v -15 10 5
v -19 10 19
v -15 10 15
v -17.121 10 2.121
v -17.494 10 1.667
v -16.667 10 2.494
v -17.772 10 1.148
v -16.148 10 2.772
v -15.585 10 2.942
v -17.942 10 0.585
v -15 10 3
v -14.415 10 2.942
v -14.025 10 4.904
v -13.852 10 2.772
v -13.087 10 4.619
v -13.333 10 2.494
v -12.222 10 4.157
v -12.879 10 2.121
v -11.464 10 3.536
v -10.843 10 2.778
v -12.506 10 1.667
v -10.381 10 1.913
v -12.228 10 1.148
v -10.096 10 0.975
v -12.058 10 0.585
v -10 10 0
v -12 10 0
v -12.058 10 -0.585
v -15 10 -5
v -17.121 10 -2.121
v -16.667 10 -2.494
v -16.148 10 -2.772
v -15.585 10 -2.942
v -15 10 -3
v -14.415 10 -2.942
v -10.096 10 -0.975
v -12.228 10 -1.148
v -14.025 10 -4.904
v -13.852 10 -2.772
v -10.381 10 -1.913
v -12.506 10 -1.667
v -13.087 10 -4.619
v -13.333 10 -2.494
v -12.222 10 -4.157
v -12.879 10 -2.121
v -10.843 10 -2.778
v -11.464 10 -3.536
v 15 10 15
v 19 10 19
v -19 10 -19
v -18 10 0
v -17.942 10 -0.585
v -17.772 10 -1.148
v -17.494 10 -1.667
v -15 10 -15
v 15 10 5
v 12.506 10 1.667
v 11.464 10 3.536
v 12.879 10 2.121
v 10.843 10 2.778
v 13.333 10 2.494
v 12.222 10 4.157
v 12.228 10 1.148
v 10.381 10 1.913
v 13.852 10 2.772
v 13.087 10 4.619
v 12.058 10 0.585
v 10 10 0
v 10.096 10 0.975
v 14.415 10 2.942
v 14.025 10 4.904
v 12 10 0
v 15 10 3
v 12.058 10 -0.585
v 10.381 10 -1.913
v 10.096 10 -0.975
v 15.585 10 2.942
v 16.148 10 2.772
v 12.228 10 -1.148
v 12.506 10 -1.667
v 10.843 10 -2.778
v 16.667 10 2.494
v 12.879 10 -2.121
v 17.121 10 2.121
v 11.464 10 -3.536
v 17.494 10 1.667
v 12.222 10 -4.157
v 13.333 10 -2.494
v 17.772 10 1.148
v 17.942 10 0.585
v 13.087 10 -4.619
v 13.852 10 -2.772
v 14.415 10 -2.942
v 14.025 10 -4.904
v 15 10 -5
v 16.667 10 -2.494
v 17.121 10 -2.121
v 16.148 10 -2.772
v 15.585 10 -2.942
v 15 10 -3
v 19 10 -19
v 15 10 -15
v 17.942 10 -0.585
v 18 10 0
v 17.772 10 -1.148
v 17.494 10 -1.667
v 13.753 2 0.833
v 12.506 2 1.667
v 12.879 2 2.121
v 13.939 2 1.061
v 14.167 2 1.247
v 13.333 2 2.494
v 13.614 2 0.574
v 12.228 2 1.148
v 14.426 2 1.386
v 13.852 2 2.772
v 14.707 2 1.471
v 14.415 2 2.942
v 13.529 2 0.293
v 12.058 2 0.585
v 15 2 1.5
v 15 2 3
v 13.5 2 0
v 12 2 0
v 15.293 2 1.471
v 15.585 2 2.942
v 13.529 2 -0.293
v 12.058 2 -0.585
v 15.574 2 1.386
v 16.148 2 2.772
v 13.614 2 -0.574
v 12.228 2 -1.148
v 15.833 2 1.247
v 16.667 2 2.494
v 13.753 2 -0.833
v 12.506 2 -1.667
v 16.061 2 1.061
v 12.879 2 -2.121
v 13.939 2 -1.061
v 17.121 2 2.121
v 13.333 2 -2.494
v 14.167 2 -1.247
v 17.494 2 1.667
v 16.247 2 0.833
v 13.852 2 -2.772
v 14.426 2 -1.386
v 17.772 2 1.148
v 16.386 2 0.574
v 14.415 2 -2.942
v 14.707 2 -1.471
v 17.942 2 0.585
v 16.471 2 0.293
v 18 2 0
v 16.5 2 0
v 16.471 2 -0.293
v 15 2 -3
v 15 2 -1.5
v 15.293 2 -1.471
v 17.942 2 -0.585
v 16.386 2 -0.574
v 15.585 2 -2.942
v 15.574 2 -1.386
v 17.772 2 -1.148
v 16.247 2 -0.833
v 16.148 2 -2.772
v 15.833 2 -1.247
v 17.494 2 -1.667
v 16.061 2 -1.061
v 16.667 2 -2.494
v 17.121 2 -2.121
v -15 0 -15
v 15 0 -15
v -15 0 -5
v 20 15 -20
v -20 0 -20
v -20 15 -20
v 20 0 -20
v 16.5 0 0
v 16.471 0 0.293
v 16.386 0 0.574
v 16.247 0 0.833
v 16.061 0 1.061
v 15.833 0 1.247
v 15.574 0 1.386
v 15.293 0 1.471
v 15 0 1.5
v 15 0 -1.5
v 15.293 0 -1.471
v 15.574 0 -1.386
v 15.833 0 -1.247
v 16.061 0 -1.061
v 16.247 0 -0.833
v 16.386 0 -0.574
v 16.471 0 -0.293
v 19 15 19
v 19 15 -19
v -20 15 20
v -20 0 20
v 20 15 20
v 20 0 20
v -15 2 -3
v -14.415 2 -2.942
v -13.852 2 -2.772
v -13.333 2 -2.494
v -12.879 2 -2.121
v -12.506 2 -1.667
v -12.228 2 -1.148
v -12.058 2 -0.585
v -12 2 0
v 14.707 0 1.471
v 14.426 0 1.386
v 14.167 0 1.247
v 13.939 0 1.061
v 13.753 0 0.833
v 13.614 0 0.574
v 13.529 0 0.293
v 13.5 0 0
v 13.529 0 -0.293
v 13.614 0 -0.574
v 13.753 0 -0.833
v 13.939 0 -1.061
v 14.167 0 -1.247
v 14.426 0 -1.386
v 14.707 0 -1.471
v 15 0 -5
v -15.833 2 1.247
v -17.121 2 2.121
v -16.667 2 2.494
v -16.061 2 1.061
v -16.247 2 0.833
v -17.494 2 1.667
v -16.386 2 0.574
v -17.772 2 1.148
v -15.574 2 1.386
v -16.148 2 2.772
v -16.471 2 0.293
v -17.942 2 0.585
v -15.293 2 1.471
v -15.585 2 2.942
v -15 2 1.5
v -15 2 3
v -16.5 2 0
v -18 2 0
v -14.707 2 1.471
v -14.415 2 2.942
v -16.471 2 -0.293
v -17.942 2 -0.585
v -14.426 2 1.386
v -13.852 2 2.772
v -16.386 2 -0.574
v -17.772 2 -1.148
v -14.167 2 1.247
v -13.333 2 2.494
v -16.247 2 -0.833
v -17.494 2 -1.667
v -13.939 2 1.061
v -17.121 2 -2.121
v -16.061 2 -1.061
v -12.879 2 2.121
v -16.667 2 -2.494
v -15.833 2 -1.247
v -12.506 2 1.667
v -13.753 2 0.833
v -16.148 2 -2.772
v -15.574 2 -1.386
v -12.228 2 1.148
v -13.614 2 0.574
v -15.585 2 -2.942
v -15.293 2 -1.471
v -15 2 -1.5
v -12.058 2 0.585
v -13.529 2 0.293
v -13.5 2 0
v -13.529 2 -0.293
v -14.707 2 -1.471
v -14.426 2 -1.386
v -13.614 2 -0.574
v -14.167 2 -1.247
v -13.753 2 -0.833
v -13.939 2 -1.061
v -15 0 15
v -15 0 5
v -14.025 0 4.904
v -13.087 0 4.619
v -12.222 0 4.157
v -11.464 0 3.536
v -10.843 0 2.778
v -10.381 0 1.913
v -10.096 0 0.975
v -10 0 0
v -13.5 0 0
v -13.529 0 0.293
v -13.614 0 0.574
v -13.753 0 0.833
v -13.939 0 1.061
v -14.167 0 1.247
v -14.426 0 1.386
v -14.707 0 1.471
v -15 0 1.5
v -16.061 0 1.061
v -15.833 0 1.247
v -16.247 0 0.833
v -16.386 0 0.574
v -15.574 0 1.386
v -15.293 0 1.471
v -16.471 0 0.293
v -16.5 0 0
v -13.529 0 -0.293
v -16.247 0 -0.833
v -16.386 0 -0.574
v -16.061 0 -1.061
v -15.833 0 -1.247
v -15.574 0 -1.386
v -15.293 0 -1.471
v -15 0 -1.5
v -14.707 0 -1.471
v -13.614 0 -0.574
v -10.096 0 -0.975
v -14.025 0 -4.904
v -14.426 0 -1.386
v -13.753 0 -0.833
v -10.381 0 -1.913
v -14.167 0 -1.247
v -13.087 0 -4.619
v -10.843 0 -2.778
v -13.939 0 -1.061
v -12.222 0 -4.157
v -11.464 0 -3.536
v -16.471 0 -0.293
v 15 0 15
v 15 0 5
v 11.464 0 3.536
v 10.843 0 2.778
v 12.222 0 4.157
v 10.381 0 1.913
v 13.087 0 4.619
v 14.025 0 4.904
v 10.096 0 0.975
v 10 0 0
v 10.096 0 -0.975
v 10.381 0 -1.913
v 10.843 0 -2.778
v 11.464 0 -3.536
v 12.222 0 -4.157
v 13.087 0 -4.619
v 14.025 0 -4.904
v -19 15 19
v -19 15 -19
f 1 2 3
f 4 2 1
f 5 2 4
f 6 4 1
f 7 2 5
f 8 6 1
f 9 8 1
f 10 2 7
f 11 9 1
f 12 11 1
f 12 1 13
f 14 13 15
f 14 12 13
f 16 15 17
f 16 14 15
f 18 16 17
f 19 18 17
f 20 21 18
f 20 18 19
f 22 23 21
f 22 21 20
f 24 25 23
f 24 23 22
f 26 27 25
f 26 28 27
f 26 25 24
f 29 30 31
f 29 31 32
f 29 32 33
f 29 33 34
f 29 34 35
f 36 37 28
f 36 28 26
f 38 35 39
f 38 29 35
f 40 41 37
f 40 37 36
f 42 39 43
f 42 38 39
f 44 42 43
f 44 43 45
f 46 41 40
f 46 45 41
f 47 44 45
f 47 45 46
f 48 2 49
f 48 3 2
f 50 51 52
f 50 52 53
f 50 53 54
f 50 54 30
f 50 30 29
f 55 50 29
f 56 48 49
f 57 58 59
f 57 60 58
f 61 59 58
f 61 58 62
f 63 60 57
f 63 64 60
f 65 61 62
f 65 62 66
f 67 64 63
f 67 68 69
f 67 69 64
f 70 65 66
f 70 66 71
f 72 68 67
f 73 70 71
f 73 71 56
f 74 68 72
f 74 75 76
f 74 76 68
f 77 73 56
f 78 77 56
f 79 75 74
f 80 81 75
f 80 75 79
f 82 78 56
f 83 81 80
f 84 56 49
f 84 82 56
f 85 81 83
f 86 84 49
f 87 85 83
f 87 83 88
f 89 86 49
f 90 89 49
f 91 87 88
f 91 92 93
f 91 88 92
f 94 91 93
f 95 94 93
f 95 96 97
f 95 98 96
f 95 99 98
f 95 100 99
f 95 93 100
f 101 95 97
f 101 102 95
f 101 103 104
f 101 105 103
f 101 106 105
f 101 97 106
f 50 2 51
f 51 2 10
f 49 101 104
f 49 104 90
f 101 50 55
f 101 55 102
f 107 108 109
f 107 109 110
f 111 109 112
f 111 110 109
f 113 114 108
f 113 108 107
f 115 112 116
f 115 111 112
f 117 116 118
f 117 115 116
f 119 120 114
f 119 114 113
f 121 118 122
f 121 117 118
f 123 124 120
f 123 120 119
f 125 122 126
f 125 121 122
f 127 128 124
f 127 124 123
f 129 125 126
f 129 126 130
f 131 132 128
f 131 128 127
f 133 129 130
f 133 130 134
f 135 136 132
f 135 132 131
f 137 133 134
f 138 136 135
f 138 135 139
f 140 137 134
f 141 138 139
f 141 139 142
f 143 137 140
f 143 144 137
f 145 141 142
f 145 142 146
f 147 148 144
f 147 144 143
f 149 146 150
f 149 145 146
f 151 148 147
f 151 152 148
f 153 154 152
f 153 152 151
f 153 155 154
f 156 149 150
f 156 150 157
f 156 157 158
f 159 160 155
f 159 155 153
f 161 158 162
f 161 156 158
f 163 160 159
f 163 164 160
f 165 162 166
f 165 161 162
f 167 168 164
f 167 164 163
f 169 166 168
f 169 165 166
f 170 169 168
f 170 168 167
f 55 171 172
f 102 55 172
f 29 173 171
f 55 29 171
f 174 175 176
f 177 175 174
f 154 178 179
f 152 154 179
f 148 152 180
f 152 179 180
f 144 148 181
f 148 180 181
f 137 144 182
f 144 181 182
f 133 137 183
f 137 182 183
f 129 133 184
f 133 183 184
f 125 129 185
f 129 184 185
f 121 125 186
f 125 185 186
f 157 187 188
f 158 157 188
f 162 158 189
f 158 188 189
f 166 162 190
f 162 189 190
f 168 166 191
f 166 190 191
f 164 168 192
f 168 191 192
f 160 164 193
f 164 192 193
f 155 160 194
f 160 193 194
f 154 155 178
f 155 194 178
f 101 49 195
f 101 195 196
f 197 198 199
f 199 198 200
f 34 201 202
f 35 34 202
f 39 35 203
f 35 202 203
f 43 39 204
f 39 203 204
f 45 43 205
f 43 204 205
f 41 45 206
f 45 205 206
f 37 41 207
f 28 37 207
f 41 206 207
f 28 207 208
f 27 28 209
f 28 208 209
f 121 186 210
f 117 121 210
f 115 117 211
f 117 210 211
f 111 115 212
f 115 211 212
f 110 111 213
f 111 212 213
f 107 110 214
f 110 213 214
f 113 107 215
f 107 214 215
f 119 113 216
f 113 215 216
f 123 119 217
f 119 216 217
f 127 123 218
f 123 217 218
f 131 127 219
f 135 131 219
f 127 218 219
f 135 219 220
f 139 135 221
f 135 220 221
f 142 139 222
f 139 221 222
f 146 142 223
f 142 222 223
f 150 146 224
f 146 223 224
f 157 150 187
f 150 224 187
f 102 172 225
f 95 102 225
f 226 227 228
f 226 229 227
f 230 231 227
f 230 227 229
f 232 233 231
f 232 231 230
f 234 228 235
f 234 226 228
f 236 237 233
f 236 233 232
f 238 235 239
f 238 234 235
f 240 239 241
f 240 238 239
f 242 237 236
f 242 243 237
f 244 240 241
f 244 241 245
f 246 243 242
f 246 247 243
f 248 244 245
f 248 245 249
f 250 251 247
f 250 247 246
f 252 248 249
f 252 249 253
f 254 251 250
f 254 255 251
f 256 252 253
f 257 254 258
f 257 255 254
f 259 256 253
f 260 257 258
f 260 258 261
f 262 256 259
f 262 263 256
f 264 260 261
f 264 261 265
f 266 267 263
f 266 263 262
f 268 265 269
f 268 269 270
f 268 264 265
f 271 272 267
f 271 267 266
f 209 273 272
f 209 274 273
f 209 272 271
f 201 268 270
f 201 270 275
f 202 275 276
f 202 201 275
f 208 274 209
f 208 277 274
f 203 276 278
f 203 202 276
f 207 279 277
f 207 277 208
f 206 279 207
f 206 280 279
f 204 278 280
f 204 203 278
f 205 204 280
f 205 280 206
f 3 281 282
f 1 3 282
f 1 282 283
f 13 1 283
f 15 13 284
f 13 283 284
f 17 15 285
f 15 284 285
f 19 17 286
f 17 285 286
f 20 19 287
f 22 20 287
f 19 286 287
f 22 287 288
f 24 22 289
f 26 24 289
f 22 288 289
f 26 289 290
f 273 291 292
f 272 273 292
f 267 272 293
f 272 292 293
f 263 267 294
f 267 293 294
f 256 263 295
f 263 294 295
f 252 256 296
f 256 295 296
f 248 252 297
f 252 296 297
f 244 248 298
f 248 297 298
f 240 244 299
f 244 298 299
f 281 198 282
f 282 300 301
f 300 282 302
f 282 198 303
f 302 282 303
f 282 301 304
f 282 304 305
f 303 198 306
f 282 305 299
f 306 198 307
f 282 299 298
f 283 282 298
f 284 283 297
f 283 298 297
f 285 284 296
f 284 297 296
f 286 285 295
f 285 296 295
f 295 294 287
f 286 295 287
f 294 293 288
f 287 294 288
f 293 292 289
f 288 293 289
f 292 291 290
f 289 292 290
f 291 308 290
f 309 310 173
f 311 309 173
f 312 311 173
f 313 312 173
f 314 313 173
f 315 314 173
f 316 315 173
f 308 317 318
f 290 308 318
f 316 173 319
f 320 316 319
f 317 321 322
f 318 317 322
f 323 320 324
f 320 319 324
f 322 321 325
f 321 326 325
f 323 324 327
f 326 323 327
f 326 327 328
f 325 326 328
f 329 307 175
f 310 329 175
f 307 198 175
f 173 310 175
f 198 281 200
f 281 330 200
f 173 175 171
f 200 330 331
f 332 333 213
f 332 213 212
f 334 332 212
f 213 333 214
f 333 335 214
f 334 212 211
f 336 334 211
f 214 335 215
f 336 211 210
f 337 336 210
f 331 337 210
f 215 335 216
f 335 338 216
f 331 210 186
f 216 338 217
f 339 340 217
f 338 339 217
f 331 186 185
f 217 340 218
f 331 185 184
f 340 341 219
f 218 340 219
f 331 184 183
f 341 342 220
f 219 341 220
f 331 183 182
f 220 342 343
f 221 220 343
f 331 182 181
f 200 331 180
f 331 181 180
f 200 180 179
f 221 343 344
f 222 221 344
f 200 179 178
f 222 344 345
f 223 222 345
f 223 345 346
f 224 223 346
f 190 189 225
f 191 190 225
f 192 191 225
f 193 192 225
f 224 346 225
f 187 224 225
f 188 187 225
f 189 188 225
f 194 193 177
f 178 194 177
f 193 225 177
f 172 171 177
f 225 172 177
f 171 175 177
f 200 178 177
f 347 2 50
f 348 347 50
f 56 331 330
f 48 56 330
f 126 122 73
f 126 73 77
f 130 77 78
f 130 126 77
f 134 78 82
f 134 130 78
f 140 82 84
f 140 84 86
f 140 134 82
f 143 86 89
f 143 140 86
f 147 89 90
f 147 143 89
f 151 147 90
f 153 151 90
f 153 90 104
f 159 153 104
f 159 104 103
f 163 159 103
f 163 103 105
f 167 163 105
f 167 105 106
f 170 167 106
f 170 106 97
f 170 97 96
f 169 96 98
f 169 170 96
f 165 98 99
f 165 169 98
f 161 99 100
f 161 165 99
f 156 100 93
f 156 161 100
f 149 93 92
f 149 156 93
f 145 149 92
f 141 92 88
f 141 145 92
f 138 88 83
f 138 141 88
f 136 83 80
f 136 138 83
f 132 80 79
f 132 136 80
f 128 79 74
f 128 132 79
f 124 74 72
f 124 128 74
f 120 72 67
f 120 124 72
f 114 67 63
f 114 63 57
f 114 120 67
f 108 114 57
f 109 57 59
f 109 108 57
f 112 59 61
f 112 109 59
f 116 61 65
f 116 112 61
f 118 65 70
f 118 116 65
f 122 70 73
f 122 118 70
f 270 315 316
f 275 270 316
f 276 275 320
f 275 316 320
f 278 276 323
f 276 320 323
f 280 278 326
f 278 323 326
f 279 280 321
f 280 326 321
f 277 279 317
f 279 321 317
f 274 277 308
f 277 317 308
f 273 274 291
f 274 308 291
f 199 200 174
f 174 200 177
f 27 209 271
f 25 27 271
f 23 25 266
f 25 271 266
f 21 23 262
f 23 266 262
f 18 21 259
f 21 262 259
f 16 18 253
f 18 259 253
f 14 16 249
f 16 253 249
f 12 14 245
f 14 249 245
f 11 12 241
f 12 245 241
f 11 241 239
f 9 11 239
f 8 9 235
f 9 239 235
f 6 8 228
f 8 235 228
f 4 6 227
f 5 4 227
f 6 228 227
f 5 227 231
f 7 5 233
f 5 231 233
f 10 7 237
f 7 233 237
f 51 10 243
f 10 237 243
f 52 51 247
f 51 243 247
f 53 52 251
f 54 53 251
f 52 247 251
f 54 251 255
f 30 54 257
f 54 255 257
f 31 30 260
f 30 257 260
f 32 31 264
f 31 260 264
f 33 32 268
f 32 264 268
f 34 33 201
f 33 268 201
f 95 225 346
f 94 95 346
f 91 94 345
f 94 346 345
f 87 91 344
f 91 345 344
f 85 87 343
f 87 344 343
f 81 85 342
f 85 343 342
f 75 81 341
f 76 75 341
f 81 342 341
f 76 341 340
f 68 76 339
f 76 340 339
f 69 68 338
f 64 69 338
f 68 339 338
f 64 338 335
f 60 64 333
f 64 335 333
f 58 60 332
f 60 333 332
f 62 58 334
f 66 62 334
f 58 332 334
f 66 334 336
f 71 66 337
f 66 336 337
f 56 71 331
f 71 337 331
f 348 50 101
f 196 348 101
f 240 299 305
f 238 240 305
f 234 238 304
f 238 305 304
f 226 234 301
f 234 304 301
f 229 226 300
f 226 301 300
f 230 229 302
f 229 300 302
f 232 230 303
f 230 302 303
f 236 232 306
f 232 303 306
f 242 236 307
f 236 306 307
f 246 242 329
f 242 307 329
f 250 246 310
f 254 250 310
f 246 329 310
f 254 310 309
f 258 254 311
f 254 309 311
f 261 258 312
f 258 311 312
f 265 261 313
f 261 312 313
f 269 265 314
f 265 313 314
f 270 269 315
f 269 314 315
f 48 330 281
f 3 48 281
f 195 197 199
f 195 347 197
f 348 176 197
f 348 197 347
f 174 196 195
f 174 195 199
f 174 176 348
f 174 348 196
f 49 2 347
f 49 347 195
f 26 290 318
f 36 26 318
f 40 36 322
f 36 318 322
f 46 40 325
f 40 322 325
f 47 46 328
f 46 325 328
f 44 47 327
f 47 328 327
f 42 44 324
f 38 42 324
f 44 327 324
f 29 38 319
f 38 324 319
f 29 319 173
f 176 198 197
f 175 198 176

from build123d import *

# Parameters (mm, degrees)
SKETCH1_W           = 40
SKETCH1_H           = 40
SKETCH1_R           = 3
BOSS_EXTRUDE2_DEPTH = 10
BOSS_EXTRUDE3_DEPTH = 10
SKETCH1_5_R         = 3
SKETCH1_5_R_2       = 1.5
BOSS_EXTRUDE4_DEPTH = 2
SKETCH2_W           = 40
SKETCH2_H           = 40
SKETCH2_W_2         = 38
SKETCH2_H_2         = 38
BOSS_EXTRUDE5_DEPTH = 5


with BuildPart() as part:
    # Sketch1 → Boss-Extrude2 (new body)
    with BuildSketch(Plane(origin=(0, 0, 0), x_dir=(1, 0, 0), z_dir=(0, 1, 0))):
        Rectangle(SKETCH1_W, SKETCH1_H)
        with BuildLine():
            Line((-15, 3), (-15, 15))
            Line((-15, 15), (15, 15))
            Line((15, 15), (15, 5))
            ThreePointArc((15, 5), (10, 0), (15, -5))
            Line((15, -5), (15, -15))
            Line((15, -15), (-15, -15))
            Line((-15, -15), (-15, -3))
            ThreePointArc((-15, -3), (-18, 0), (-15, 3))
        make_face(mode=Mode.SUBTRACT)
        with Locations((15, 0)):
            Circle(SKETCH1_R, mode=Mode.SUBTRACT)
    extrude(amount=BOSS_EXTRUDE2_DEPTH)

    # Sketch1<4> → Boss-Extrude3 (add)
    with BuildSketch(Plane(origin=(0, 0, 0), x_dir=(1, 0, 0), z_dir=(0, 1, 0))):
        with BuildLine():
            ThreePointArc((-10, 0), (-11.464466094, 3.535533906), (-15, 5))
            Line((-15, 5), (-15, 3))
            ThreePointArc((-15, 3), (-12.878679656, 2.121320344), (-12, 0))
            ThreePointArc((-12, 0), (-12.878679656, -2.121320344), (-15, -3))
            Line((-15, -3), (-15, -5))
            ThreePointArc((-15, -5), (-11.464466094, -3.535533906), (-10, 0))
        make_face()
    extrude(amount=BOSS_EXTRUDE3_DEPTH)

    # Sketch1<5> → Boss-Extrude4 (add)
    # profile 1 of 2: a face of its own
    with BuildSketch(Plane(origin=(0, 0, 0), x_dir=(1, 0, 0), z_dir=(0, 1, 0))):
        with Locations((-15, 0)):
            Circle(SKETCH1_5_R)
        with Locations((-15, 0)):
            Circle(SKETCH1_5_R_2, mode=Mode.SUBTRACT)
    # profile 2 of 2: a face of its own
    with BuildSketch(Plane(origin=(0, 0, 0), x_dir=(1, 0, 0), z_dir=(0, 1, 0))):
        with Locations((15, 0)):
            Circle(SKETCH1_5_R)
        with Locations((15, 0)):
            Circle(SKETCH1_5_R_2, mode=Mode.SUBTRACT)
    extrude(amount=BOSS_EXTRUDE4_DEPTH)

    # Sketch2 → Boss-Extrude5 (add)
    with BuildSketch(Plane(origin=(0, 10, 0), x_dir=(1, 0, 0), z_dir=(0, 1, 0))):
        Rectangle(SKETCH2_W, SKETCH2_H)
        Rectangle(SKETCH2_W_2, SKETCH2_H_2, mode=Mode.SUBTRACT)
    extrude(amount=BOSS_EXTRUDE5_DEPTH)


solid = part.part
